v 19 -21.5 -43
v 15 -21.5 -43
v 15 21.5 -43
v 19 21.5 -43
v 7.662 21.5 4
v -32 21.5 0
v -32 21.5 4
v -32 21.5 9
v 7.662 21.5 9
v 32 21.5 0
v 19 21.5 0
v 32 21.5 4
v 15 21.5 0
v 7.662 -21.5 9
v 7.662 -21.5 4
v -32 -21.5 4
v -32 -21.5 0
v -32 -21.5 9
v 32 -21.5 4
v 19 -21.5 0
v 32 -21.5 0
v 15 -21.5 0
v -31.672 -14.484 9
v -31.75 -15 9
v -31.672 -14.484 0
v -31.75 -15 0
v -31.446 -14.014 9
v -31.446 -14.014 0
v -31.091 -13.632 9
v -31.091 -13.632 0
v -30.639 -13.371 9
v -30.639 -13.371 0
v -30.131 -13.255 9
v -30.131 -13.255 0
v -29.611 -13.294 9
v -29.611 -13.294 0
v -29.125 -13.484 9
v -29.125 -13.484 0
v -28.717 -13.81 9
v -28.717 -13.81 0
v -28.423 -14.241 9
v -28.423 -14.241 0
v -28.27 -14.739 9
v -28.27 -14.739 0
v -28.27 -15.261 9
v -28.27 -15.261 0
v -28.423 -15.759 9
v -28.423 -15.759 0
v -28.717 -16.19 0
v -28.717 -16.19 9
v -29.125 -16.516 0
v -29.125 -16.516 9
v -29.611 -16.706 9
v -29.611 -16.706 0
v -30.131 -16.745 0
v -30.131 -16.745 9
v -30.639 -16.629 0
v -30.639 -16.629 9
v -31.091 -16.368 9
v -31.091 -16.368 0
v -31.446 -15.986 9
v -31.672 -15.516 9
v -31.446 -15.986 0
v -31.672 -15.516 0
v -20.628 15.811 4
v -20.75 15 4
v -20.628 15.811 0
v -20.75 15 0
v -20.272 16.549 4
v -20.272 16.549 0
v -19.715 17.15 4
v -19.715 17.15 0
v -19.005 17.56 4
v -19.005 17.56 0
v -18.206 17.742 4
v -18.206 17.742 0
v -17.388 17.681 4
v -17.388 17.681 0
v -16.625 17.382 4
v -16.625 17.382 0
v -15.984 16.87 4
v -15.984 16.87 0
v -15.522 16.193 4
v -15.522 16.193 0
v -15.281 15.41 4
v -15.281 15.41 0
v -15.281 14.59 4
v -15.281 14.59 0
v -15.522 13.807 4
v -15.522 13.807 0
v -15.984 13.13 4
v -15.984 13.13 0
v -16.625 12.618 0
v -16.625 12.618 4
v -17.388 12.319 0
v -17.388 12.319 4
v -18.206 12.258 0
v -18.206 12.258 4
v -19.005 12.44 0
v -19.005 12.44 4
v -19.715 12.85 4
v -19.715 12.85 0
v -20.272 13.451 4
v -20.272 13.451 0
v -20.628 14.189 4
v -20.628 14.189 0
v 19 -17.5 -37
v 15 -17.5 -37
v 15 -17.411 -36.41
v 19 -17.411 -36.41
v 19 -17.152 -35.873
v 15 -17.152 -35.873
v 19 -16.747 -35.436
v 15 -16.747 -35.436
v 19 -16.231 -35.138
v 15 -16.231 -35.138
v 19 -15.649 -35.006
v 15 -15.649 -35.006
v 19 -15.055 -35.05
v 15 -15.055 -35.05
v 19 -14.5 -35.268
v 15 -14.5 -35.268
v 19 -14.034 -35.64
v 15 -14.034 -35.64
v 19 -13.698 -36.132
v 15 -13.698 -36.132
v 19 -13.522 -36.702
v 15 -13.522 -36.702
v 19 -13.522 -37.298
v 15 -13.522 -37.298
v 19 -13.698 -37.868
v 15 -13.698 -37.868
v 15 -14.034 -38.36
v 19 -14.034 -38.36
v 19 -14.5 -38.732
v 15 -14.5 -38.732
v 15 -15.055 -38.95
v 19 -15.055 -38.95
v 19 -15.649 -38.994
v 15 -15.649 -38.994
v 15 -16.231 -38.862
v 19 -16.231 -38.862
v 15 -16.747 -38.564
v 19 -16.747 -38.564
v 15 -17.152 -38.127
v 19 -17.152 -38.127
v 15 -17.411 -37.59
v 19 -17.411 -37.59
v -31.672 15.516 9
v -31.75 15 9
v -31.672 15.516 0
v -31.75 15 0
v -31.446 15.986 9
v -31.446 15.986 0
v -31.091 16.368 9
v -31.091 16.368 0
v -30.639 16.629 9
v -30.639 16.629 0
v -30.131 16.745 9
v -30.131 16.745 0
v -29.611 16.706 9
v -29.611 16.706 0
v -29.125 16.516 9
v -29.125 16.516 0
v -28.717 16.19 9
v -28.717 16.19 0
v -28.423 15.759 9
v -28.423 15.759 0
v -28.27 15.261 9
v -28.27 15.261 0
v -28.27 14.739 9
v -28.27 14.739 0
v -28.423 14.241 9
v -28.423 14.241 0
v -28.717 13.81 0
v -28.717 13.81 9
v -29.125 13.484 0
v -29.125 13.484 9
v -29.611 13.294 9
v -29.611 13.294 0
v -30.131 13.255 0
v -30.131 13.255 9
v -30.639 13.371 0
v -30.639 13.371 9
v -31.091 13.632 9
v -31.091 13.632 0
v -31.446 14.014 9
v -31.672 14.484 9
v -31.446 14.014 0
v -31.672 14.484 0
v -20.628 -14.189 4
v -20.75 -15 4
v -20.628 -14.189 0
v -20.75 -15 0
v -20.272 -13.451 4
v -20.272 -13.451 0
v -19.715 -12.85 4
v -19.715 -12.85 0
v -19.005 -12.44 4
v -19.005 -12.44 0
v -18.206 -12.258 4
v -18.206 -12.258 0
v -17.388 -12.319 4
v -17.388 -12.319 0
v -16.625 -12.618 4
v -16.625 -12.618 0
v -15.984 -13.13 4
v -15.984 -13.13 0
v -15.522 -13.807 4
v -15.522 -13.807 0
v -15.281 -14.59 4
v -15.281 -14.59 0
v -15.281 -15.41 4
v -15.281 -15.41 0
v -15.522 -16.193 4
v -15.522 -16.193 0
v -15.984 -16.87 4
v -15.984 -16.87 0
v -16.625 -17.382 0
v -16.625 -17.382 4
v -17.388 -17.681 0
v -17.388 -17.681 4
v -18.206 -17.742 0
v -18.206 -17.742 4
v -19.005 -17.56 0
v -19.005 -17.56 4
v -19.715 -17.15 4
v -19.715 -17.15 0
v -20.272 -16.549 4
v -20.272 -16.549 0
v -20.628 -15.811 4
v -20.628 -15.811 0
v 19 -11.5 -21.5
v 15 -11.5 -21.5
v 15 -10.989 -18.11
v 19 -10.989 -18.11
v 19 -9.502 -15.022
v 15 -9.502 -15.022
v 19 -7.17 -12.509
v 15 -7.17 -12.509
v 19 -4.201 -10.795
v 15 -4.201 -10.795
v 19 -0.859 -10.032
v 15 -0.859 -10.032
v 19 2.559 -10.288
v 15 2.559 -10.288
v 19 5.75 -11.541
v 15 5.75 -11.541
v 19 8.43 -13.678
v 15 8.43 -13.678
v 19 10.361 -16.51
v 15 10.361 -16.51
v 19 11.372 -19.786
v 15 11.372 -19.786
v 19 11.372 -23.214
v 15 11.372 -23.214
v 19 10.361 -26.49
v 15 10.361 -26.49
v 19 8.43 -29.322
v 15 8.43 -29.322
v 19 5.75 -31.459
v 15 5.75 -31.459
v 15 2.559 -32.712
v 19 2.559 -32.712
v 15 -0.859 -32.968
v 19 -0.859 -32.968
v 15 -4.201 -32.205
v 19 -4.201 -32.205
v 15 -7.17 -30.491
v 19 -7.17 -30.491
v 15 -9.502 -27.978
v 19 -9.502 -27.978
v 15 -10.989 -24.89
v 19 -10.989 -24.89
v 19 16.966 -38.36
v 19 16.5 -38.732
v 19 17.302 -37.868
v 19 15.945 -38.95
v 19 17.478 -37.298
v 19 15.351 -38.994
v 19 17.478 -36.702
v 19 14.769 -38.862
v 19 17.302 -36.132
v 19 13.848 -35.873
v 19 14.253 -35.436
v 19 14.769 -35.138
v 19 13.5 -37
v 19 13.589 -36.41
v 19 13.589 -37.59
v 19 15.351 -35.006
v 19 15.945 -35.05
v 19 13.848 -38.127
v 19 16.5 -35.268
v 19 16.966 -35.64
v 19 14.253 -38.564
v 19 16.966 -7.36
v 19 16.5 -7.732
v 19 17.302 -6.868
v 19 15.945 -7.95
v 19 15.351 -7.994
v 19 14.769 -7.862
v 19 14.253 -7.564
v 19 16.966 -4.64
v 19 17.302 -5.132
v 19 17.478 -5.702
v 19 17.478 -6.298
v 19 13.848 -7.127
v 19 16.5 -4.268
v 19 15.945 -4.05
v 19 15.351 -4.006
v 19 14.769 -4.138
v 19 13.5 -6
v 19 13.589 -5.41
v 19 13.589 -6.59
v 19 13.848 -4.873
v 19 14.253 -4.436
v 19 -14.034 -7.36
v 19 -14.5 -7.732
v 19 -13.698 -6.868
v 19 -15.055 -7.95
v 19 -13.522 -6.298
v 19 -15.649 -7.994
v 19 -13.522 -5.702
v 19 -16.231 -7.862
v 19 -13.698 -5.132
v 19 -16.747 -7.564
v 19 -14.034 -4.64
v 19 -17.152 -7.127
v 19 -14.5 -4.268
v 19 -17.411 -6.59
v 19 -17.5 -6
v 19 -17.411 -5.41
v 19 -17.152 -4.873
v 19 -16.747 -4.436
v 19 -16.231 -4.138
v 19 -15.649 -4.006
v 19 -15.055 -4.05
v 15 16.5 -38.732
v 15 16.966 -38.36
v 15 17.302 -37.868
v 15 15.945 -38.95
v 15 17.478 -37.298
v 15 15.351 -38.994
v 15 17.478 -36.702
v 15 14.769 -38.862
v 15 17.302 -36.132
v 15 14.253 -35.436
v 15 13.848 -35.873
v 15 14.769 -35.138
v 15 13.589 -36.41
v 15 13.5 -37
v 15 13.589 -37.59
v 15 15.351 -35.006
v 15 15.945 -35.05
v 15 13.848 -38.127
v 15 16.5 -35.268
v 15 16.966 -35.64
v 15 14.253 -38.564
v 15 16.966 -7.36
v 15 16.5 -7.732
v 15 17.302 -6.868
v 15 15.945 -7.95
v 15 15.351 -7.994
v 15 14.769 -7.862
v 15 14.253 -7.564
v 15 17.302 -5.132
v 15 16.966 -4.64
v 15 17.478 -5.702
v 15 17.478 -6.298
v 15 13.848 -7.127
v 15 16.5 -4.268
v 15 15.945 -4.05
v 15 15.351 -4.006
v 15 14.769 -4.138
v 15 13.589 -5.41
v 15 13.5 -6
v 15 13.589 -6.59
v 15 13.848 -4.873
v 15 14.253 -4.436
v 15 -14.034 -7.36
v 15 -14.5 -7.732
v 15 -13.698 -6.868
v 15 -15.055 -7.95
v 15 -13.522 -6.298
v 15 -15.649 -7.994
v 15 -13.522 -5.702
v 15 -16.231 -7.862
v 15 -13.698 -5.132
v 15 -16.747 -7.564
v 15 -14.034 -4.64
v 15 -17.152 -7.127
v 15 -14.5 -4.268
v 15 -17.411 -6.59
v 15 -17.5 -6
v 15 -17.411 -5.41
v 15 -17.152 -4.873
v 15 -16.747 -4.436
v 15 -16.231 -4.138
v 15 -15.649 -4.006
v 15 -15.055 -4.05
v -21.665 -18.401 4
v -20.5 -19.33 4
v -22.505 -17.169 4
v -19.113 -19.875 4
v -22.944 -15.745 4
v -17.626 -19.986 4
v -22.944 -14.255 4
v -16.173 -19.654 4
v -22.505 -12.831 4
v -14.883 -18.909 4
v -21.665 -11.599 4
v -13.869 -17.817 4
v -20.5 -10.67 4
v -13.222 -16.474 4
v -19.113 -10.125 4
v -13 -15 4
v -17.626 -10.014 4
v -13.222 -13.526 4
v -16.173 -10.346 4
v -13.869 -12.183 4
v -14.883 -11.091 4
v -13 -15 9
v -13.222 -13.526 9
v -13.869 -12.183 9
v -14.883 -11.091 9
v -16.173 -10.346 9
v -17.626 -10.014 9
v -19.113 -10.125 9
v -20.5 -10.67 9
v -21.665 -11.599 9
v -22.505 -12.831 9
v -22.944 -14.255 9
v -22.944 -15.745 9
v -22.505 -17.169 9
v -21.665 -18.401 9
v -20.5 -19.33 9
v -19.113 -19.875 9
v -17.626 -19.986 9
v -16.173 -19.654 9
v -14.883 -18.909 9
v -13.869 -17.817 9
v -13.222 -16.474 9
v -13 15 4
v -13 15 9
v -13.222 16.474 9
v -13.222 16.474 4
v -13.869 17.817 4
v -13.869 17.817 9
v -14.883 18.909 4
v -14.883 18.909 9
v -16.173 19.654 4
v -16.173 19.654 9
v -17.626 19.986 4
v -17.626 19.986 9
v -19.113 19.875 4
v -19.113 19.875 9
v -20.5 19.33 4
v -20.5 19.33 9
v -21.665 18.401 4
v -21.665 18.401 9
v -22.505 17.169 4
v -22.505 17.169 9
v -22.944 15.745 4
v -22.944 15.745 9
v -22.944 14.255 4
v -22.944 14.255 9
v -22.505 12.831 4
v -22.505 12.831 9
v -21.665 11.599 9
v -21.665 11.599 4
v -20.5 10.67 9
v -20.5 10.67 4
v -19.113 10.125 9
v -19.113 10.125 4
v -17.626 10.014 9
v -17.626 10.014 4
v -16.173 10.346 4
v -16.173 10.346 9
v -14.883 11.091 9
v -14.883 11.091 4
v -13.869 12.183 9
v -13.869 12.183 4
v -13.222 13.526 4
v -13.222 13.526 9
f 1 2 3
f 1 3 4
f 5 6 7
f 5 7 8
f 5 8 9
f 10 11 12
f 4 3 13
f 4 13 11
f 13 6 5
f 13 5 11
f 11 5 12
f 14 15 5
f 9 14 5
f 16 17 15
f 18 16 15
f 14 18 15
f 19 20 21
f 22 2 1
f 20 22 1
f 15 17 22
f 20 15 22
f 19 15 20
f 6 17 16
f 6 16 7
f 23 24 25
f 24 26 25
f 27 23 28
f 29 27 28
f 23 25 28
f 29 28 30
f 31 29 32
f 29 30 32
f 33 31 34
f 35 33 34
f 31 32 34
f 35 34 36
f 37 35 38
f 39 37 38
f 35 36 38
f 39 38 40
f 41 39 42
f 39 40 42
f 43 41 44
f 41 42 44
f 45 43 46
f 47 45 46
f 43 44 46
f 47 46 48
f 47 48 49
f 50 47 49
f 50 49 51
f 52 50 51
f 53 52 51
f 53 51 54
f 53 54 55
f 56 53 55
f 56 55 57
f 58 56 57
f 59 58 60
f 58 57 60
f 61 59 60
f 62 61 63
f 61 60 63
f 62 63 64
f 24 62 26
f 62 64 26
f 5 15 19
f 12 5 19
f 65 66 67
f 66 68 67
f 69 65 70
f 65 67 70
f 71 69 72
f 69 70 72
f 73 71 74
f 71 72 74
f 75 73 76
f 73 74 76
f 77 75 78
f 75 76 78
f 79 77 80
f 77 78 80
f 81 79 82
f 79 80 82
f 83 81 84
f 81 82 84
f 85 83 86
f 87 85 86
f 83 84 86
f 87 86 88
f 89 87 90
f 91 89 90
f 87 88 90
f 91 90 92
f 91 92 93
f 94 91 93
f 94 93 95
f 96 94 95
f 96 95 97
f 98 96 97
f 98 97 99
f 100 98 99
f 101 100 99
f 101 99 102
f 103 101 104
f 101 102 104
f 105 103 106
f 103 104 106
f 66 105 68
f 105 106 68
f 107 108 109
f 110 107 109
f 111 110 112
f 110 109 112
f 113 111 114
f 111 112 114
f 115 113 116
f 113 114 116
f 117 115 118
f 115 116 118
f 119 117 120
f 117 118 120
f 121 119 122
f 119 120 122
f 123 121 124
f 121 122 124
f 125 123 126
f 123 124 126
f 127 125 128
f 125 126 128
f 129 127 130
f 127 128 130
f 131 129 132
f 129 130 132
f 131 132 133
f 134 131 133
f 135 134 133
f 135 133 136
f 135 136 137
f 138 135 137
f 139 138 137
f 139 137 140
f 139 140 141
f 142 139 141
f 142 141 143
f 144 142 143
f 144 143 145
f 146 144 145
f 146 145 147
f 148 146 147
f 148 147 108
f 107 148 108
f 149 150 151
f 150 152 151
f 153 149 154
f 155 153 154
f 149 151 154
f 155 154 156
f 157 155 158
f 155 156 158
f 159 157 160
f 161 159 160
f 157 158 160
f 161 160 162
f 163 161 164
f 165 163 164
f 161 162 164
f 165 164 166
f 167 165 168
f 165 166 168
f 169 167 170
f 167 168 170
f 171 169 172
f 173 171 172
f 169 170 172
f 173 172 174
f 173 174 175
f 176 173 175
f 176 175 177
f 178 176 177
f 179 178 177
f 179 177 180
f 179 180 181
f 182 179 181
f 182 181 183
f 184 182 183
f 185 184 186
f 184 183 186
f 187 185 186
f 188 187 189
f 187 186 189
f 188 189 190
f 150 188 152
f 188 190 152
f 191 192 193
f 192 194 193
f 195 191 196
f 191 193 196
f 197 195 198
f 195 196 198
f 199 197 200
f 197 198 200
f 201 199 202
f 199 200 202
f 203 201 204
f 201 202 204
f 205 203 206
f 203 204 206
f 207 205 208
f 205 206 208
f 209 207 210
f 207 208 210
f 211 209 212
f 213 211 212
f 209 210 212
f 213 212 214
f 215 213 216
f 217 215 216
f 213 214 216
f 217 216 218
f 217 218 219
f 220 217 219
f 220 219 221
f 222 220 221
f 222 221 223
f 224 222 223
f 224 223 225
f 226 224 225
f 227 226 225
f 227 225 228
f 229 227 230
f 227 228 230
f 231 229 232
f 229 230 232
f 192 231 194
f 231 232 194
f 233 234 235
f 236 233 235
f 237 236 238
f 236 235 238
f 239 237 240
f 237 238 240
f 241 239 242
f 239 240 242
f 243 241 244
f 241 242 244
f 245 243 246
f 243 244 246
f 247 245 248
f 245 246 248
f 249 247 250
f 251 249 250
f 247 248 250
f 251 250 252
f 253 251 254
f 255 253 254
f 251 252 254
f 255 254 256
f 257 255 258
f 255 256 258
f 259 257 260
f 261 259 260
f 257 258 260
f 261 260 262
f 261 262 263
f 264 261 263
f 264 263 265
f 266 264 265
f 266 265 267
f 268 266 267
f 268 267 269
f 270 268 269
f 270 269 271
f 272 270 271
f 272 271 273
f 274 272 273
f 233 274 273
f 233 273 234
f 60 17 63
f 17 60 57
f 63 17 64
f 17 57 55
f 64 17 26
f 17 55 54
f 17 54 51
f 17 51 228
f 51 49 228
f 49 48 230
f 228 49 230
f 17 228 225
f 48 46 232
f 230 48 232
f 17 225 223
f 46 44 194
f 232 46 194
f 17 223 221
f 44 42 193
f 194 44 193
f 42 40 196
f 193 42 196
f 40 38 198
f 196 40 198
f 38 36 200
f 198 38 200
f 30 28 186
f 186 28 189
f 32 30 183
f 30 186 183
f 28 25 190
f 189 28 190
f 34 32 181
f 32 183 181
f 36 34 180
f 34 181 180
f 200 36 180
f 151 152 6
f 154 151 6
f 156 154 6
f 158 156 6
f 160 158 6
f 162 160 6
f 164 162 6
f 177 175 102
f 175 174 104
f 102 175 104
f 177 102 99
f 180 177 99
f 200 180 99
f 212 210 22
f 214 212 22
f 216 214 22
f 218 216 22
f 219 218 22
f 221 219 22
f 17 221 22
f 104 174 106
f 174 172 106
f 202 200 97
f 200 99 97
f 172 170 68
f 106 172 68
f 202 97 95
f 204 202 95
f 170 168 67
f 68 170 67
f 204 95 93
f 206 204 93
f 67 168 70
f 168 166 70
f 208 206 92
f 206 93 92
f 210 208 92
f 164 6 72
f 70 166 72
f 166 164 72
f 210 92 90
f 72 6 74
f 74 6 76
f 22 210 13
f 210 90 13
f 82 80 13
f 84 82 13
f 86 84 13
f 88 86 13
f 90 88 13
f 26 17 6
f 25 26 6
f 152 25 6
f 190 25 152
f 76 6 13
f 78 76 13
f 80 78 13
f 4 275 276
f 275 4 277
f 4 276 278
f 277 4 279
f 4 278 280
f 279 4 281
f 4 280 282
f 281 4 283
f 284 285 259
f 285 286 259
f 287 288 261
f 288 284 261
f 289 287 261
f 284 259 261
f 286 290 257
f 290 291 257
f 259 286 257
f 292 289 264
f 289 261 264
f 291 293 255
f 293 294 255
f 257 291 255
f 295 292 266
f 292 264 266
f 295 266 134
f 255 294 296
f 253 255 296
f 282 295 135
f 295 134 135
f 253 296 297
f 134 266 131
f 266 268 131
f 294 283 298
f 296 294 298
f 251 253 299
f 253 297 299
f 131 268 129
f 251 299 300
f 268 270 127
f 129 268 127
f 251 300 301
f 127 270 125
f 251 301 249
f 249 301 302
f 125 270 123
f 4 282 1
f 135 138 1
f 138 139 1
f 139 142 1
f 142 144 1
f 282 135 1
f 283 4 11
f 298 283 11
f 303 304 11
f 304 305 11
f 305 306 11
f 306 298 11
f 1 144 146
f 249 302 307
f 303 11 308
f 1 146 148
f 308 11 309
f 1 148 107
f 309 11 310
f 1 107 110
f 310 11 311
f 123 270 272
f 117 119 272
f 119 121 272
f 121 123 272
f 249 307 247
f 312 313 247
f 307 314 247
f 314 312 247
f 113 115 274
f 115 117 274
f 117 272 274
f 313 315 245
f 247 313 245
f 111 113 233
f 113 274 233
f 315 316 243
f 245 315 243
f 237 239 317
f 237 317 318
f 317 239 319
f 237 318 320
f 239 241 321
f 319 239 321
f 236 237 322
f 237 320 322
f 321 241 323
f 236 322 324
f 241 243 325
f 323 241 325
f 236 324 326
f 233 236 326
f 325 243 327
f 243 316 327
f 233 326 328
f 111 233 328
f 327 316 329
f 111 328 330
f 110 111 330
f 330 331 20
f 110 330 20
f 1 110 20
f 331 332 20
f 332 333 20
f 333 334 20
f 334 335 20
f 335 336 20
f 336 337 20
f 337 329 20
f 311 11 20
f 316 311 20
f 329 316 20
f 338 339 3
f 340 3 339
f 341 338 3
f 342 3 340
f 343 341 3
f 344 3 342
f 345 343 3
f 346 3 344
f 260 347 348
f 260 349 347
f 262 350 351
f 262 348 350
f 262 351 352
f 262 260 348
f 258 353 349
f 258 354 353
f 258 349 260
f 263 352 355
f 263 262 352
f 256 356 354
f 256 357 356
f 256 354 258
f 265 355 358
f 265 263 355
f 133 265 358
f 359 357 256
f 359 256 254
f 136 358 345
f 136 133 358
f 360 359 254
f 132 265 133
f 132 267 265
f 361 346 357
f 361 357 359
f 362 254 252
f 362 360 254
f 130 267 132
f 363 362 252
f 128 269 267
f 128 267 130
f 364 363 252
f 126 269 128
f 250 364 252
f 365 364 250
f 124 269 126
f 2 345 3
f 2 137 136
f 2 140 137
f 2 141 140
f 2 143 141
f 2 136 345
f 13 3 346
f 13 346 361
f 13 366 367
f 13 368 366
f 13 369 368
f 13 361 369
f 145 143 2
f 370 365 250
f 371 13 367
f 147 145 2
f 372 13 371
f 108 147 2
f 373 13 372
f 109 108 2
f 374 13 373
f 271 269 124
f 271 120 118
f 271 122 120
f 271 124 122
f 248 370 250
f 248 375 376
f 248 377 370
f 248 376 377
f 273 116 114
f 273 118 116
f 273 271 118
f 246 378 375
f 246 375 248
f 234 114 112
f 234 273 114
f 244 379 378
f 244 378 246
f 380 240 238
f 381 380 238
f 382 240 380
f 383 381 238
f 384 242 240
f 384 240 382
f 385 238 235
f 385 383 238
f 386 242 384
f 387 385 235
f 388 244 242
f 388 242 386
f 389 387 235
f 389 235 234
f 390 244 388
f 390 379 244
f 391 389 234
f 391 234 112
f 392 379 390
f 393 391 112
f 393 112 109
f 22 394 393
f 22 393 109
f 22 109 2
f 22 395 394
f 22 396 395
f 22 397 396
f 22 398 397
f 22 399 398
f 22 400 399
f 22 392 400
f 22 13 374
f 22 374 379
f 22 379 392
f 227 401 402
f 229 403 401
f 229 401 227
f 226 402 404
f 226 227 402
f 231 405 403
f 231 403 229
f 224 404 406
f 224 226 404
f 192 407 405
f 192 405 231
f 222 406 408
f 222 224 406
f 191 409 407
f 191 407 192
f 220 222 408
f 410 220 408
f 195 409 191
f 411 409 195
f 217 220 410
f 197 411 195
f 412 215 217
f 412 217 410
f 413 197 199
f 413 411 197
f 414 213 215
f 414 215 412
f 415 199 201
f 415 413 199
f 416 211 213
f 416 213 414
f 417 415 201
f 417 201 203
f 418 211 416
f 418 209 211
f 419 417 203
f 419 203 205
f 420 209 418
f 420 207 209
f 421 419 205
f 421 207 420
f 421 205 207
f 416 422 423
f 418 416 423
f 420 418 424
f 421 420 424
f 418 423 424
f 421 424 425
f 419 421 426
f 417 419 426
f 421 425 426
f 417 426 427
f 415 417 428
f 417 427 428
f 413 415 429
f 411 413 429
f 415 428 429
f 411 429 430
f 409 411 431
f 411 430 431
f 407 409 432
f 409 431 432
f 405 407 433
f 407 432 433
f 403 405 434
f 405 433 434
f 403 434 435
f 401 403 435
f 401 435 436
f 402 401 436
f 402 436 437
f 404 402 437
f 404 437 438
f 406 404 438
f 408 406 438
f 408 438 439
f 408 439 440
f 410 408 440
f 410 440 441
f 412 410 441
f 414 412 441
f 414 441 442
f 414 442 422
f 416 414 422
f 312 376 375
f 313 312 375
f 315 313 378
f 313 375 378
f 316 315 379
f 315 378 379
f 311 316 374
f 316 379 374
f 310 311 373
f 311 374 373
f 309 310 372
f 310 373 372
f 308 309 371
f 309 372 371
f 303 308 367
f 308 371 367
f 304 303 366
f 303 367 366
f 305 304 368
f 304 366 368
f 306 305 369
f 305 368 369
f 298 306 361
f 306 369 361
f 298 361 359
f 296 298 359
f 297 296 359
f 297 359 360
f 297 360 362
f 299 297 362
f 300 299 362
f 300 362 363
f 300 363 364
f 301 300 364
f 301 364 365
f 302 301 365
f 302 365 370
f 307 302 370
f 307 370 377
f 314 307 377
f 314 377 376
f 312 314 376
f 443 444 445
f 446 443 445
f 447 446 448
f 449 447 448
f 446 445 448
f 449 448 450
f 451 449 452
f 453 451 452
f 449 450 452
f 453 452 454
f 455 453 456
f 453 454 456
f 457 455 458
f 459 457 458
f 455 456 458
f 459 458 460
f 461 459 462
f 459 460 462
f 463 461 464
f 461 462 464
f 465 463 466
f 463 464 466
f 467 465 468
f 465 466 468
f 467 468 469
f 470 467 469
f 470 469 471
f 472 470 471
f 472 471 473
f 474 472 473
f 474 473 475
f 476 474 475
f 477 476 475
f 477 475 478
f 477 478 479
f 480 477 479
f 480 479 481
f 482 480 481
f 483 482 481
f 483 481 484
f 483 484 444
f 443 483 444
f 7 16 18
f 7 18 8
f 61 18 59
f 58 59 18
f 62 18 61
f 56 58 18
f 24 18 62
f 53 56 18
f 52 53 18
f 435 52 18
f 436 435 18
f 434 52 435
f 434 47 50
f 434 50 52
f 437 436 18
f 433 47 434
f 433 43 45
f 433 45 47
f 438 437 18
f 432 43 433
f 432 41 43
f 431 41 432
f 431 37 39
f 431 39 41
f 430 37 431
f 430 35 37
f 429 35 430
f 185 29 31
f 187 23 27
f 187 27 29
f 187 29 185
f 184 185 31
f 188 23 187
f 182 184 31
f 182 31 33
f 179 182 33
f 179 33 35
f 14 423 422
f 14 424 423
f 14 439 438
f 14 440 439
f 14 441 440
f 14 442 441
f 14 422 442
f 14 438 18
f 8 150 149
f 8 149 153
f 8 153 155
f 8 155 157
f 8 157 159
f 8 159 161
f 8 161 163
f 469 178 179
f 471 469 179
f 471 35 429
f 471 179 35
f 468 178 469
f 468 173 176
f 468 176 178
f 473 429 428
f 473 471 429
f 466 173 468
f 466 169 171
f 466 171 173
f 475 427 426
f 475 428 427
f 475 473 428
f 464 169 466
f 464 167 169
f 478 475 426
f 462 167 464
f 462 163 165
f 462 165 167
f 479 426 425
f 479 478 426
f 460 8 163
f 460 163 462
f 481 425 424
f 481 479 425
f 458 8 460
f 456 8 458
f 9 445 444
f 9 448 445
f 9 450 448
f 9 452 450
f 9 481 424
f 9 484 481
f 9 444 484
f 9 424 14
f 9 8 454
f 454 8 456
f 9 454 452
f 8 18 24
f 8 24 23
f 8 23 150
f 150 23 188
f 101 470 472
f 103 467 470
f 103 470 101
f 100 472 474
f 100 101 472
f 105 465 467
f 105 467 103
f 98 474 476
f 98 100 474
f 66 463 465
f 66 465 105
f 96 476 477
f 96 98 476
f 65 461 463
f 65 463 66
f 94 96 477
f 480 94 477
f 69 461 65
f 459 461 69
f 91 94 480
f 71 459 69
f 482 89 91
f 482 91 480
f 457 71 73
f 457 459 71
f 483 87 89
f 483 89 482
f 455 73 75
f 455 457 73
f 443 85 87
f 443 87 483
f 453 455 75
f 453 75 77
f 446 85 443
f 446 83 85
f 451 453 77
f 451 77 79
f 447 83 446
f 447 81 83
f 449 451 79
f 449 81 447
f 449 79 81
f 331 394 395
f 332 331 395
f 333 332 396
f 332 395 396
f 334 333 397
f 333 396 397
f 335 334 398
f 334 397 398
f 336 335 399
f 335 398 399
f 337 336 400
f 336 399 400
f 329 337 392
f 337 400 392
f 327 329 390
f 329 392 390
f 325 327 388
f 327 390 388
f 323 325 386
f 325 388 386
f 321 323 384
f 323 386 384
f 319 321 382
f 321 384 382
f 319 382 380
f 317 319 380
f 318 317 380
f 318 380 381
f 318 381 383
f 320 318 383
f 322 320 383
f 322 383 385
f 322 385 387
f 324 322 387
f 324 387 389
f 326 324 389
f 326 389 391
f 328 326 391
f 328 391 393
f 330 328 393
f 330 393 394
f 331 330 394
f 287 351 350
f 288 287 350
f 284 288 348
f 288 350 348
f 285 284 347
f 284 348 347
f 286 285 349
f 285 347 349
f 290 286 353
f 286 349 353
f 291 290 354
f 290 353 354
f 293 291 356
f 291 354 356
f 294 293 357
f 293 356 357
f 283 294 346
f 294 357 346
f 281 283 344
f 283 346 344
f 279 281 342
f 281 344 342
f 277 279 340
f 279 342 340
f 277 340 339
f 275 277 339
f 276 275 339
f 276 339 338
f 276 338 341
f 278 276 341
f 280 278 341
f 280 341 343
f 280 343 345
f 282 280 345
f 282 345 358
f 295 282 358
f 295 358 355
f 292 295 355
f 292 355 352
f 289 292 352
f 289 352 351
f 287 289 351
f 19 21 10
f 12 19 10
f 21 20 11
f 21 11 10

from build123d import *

# Parameters (mm, degrees)
F0_W            = 64
F0_H            = 43
F8_DEPTH        = 4
F1_W            = 4
F1_H            = 43
F2_DEPTH        = 43
F4_D            = 4
F9_D            = 23
F5_W            = 39.661507
F5_H            = 43
F10_DEPTH       = 20
F7_D            = 5.5
F7_CBORE_D      = 10
F7_CBORE_DEPTH  = 20
F11_D           = 3.5
F11_CBORE_D     = 5
F11_CBORE_DEPTH = 15
F6_W            = 39.661507
F6_H            = 43
F12_DEPTH       = 15


with BuildPart() as f8:
    # F0 (on Top) → F8 (new body)
    with BuildSketch(Plane.XY):
        Rectangle(F0_W, F0_H)
    extrude(amount=F8_DEPTH)

    # F1 (on face) → F2 (join)
    with BuildSketch(Plane(origin=(0, 0, 0), x_dir=(1, 0, 0), z_dir=(0, 0, -1))):
        with Locations((17, 0)):
            Rectangle(F1_W, F1_H)
    extrude(amount=F2_DEPTH)

    # F4 (through all)
    with Locations(Plane.YZ.offset(19)):
        with Locations((15.5, -37), (15.5, -6), (-15.5, -37), (-15.5, -6)):
            Hole(F4_D / 2)

    # F9 (through all)
    with Locations(Plane.YZ.offset(19)):
        with Locations((0, -21.5)):
            Hole(F9_D / 2)

    # F5 (on face) → F10 (join)
    with BuildSketch(Plane.XY.offset(4)):
        with Locations((-12.169246, 0)):
            Rectangle(F5_W, F5_H)
    extrude(amount=F10_DEPTH)

    # F7 (through all)
    with Locations(Plane.XY.offset(24)):
        with Locations((-18, -15), (-18, 15)):
            CounterBoreHole(F7_D / 2, F7_CBORE_D / 2, F7_CBORE_DEPTH)

    # F11 (through all)
    with Locations(Plane.XY.offset(24)):
        with Locations((-30, 15), (-30, -15)):
            CounterBoreHole(F11_D / 2, F11_CBORE_D / 2, F11_CBORE_DEPTH)

    # F6 (on face) → F12 (cut)
    with BuildSketch(Plane.XY.offset(24)):
        with Locations((-12.169246, 0)):
            Rectangle(F6_W, F6_H)
    extrude(amount=-F12_DEPTH, mode=Mode.SUBTRACT)


solid = f8.part
